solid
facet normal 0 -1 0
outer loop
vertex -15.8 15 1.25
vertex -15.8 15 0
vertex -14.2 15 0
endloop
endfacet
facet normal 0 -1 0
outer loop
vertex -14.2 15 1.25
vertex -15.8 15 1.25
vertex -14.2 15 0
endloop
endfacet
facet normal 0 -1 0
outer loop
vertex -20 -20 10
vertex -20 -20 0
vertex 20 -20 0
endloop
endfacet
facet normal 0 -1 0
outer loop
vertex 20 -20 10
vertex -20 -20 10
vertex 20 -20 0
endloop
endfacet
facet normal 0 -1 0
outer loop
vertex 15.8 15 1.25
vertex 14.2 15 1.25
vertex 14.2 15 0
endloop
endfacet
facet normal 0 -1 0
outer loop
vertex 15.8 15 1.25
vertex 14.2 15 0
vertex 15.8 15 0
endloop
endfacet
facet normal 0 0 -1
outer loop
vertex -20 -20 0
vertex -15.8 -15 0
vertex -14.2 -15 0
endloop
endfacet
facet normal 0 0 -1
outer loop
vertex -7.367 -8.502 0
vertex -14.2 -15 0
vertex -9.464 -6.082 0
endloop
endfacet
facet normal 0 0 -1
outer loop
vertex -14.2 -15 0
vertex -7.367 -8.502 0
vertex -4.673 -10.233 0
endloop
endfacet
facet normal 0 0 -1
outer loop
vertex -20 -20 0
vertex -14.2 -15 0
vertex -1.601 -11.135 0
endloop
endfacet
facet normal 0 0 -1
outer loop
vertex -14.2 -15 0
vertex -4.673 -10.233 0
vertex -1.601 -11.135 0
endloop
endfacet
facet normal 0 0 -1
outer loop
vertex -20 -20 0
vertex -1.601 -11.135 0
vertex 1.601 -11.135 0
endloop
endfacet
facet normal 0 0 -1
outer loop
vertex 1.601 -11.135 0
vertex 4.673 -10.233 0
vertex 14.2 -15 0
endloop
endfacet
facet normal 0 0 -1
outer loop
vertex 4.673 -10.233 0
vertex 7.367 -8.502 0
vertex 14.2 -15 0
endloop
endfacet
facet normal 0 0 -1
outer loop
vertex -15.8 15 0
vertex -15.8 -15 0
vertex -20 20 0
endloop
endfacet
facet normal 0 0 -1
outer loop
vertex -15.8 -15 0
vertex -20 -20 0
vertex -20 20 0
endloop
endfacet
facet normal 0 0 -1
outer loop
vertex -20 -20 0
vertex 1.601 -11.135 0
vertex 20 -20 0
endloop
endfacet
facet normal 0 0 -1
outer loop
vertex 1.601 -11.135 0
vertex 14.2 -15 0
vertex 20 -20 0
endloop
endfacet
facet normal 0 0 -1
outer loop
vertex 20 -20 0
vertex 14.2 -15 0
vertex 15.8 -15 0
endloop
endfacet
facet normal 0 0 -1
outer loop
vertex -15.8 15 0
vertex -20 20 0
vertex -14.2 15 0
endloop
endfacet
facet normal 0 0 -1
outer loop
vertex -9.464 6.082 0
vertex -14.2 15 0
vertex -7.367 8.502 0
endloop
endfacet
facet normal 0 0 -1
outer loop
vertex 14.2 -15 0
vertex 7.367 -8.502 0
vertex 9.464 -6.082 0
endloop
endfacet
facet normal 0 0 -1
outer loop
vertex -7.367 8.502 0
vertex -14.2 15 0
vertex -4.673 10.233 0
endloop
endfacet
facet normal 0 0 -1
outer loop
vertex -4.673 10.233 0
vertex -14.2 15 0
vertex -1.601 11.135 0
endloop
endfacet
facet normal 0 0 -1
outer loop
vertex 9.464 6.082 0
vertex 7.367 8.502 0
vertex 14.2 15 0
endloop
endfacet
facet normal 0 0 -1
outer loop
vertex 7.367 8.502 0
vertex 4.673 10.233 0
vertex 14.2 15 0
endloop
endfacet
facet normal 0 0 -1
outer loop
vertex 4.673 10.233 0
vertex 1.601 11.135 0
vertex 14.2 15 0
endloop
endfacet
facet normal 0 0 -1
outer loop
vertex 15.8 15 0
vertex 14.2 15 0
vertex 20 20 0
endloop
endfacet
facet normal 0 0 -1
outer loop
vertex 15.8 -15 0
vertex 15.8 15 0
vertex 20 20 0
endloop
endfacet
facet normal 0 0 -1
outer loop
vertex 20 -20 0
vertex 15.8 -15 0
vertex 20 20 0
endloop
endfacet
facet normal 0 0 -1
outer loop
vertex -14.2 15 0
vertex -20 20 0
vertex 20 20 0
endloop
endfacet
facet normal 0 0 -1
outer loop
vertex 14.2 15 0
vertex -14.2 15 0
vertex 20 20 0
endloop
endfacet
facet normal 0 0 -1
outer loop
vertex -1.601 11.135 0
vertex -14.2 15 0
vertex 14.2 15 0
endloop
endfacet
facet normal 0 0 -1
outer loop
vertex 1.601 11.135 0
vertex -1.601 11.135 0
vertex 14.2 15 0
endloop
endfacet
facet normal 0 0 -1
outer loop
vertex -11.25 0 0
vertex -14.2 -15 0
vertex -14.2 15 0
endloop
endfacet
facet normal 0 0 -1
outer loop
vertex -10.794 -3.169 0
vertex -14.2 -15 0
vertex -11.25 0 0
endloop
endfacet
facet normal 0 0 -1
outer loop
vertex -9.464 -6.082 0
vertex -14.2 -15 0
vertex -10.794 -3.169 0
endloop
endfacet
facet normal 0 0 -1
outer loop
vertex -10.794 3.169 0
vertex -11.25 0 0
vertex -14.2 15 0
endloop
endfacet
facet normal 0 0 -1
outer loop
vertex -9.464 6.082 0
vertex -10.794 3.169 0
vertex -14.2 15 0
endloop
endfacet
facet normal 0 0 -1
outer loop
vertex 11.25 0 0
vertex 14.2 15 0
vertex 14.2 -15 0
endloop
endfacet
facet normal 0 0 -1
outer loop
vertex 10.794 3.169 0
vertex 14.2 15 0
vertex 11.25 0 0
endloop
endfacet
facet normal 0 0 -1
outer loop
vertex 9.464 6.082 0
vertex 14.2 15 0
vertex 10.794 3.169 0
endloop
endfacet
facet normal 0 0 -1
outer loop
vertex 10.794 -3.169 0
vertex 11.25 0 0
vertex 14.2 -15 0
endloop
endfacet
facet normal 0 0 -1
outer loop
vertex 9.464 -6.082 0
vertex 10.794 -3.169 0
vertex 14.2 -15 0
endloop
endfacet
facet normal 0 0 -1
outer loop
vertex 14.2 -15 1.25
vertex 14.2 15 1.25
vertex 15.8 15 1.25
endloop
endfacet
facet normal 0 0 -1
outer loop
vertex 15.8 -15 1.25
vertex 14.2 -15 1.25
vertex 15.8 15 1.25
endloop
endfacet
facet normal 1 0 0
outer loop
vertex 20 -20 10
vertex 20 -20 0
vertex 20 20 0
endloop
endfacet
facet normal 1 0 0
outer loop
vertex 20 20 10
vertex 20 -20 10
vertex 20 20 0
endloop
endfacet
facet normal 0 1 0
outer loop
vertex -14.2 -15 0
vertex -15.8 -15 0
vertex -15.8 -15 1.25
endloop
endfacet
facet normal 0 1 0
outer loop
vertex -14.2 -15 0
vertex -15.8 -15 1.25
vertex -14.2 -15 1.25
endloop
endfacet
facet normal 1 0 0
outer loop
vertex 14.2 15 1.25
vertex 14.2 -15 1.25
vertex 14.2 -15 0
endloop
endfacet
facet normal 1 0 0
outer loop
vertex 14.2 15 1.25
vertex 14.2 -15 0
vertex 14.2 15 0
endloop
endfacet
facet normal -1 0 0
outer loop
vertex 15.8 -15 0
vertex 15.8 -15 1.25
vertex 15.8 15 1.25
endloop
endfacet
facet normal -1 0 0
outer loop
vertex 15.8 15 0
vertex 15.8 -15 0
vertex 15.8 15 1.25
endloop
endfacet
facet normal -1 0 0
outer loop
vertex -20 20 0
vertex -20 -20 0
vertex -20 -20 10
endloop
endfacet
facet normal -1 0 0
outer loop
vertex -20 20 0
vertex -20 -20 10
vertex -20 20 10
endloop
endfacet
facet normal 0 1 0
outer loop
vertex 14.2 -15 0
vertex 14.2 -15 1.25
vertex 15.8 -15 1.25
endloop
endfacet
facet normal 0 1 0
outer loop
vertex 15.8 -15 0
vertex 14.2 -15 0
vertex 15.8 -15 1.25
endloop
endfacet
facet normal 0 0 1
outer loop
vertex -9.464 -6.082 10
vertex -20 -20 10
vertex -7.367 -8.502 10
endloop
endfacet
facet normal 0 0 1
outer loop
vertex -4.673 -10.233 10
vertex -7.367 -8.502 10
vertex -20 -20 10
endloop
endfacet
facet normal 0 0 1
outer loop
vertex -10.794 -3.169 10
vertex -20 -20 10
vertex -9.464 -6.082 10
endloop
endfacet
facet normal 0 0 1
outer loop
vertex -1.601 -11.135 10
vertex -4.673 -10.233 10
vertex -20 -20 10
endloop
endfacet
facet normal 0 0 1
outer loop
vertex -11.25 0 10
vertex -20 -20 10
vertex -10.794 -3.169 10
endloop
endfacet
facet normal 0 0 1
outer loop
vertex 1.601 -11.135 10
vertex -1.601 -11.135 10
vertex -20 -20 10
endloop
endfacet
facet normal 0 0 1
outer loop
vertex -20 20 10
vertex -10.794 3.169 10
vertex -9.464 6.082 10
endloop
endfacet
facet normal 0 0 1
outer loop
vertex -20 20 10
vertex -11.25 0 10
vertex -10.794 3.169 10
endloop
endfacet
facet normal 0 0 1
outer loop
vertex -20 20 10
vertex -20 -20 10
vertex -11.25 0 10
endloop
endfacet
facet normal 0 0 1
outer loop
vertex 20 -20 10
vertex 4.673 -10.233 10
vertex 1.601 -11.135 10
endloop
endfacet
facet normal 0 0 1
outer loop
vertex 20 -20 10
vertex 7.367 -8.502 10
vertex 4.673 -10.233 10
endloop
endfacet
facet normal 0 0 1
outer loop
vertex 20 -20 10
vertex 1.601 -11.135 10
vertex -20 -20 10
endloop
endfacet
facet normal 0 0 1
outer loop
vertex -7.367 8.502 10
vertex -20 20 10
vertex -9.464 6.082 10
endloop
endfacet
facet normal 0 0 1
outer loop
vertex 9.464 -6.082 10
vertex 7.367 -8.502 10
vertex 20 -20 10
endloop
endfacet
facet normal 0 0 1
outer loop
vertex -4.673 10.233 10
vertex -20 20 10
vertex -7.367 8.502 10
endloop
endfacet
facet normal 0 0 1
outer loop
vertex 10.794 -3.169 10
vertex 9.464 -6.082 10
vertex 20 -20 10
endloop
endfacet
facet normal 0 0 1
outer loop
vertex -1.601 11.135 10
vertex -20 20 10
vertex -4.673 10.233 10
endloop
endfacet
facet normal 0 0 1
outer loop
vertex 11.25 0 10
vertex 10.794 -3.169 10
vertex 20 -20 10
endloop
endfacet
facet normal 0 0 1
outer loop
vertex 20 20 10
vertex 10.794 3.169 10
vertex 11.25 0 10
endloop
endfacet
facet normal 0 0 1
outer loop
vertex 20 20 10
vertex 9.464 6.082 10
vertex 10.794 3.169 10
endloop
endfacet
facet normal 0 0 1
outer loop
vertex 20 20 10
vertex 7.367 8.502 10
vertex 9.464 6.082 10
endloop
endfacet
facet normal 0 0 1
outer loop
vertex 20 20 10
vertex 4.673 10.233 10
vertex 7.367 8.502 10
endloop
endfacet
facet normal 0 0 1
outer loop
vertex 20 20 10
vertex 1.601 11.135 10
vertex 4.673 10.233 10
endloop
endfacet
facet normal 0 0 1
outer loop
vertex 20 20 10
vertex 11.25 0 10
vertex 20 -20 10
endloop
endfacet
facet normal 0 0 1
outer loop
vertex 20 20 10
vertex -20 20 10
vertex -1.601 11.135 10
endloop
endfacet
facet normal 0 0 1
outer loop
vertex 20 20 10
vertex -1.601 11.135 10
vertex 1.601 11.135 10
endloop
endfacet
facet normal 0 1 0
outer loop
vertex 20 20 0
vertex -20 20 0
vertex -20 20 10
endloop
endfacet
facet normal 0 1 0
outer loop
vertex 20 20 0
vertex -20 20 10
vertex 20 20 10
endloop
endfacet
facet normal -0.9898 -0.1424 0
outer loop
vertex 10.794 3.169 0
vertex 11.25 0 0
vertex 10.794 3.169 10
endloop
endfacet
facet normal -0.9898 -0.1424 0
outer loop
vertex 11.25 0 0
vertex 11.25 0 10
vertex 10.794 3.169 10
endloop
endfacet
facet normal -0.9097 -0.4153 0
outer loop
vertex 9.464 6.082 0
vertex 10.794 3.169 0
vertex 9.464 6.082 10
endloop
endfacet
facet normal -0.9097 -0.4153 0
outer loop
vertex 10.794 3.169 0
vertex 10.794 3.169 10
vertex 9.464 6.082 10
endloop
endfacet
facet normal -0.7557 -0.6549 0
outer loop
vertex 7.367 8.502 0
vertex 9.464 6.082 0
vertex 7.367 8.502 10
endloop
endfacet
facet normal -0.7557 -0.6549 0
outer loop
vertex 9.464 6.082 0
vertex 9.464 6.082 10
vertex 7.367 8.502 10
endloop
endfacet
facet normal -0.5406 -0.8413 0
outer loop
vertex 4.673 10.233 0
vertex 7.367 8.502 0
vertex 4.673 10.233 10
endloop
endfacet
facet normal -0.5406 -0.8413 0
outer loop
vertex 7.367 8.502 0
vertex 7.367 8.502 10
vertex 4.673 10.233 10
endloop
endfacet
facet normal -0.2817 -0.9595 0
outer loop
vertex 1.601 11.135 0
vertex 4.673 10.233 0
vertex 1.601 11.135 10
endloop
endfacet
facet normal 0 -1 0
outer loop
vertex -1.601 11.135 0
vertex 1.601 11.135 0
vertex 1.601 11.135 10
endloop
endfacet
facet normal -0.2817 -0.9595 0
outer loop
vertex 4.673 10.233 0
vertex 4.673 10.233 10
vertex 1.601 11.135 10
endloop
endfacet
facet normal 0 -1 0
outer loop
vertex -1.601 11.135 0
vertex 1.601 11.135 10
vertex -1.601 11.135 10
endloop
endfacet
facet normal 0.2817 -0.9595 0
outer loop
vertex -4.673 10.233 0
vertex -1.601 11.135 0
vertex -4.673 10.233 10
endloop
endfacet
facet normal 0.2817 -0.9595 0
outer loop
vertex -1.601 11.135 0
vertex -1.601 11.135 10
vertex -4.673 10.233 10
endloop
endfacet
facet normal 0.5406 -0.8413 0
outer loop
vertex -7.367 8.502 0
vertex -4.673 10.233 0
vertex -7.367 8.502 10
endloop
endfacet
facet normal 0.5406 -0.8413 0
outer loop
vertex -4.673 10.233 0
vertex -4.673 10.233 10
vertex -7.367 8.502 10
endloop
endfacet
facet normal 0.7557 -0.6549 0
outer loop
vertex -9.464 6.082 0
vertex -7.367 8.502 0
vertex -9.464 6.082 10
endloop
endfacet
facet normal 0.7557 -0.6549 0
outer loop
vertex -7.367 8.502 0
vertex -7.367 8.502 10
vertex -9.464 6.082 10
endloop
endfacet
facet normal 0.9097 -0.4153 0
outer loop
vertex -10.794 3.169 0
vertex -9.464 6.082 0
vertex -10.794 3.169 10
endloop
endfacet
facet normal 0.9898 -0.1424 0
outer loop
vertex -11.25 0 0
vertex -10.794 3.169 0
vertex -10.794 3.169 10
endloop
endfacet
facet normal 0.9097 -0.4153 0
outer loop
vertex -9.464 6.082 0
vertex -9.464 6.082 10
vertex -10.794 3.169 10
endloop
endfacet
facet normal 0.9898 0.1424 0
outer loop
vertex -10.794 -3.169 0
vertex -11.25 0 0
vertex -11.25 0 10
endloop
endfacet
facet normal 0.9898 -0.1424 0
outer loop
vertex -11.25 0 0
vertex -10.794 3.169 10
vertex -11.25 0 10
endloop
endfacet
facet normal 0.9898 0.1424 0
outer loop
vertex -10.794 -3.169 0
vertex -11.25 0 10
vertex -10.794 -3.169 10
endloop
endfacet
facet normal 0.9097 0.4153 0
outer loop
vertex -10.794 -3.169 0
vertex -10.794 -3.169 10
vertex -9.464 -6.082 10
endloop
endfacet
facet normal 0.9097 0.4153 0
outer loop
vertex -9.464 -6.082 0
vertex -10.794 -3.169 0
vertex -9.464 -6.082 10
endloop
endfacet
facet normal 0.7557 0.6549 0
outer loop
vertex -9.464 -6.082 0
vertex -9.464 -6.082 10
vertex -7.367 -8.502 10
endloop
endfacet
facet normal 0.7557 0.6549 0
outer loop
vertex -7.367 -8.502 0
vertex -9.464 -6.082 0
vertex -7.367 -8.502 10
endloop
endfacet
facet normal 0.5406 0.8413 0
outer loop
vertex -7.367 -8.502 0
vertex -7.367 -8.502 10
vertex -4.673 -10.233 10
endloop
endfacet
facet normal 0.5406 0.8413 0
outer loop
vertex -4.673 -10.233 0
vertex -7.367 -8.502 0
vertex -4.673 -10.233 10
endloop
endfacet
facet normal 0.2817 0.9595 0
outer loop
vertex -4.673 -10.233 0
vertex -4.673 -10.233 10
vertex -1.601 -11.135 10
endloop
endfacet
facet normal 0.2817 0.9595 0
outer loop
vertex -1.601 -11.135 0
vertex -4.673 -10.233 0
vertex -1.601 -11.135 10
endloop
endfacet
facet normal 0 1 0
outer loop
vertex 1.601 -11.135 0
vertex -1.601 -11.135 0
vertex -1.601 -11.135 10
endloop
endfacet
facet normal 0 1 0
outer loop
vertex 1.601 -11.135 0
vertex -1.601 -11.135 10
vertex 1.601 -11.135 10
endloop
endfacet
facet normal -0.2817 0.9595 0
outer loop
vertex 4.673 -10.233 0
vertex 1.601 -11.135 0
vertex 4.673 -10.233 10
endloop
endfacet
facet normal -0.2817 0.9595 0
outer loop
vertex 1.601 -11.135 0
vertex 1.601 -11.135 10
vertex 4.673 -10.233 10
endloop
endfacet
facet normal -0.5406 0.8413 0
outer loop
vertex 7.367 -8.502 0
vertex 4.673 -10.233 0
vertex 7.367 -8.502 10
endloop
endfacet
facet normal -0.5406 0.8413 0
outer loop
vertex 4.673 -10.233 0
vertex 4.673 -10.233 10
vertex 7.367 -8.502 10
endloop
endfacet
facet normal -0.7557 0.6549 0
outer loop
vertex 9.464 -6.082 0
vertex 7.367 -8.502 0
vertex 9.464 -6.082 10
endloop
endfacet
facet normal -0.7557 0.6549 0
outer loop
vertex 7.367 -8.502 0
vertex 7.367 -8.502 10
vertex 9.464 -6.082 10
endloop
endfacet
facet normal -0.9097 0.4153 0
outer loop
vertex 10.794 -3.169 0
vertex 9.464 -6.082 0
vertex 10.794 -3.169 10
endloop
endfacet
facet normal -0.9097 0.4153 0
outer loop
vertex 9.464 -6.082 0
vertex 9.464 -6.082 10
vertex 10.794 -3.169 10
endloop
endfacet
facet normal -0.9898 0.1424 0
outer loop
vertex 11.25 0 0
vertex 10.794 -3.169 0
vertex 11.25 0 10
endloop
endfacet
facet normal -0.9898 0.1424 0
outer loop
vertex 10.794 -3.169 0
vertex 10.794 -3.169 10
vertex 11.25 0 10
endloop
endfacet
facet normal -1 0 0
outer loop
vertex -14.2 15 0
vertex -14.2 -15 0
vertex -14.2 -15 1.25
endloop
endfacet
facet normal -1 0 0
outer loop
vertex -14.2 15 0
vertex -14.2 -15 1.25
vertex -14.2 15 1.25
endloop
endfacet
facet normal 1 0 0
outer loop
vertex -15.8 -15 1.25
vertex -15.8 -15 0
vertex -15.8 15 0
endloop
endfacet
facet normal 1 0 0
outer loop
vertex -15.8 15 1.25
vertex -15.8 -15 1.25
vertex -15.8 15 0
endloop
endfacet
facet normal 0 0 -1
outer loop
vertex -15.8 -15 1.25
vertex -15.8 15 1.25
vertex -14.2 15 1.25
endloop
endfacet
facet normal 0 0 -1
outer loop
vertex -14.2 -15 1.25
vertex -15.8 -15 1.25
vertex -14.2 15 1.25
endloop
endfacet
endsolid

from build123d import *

# Parameters (mm, degrees)
F0_W     = 40
F0_H     = 40
F1_DEPTH = 10
F2_W     = 1.6
F2_H     = 30
F3_DEPTH = 1.25
F4_R     = 11.25
F5_DEPTH = 12.5


with BuildPart() as f1:
    # F0 (on Top) → F1 (new body)
    with BuildSketch(Plane.XY):
        Rectangle(F0_W, F0_H)
    extrude(amount=F1_DEPTH)

    # F2 (on Top) → F3 (cut, symmetric)
    with BuildSketch(Plane.XY):
        with Locations((-15, 0)):
            Rectangle(F2_W, F2_H)
        with Locations((15, 0)):
            Rectangle(F2_W, F2_H)
    extrude(amount=F3_DEPTH, both=True, mode=Mode.SUBTRACT)

    # F4 (on Top) → F5 (cut, symmetric)
    with BuildSketch(Plane.XY):
        Circle(F4_R)
    extrude(amount=F5_DEPTH, both=True, mode=Mode.SUBTRACT)


solid = f1.part
